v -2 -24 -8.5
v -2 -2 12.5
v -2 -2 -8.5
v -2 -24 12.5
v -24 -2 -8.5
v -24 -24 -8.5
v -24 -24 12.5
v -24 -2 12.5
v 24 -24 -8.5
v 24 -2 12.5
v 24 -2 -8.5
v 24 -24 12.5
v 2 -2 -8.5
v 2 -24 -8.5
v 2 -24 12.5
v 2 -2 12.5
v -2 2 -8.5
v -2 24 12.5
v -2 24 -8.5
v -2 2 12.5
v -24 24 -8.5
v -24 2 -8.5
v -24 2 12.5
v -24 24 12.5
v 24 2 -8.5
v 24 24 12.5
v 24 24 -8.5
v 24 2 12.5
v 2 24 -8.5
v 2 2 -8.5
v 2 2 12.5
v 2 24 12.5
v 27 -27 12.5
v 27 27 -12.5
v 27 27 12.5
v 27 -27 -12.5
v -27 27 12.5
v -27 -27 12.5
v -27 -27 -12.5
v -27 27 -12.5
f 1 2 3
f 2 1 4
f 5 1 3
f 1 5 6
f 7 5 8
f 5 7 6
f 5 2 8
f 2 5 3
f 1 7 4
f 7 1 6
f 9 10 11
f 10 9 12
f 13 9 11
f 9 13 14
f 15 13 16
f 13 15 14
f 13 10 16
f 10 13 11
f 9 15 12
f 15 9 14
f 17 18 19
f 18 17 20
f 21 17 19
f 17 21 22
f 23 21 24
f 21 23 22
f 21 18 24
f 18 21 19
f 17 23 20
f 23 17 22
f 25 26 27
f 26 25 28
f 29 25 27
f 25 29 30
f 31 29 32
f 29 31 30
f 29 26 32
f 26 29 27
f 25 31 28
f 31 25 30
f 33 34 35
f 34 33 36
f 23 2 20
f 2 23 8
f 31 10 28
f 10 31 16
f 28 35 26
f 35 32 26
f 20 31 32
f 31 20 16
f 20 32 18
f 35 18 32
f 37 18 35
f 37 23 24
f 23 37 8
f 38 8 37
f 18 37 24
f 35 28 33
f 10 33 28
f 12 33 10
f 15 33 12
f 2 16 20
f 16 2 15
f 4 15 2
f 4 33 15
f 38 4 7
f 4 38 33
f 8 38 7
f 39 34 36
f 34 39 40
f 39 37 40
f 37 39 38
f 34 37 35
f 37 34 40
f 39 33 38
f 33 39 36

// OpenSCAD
$fn = 32;

// ----------------------------------------------------------------------
// Pocket plate 54 x 54 x 25
// 2 x 2 pockets 22 mm square, 21 mm deep
// ----------------------------------------------------------------------

// --- parameters (mm) ---
thickness = 25;  // plate thickness
floor_t = 4;     // material left under each pocket
pocket = 22;     // pocket side length
pitch_x = 26;    // pocket pitch along X
pitch_y = 26;    // pocket pitch along Y
cols = 2;        // pockets per row
rows = 2;        // rows of pockets

// --- derived feature positions (mm) ---
depth = thickness - floor_t;        // = 21   pocket depth, down to the floor
span_x = (cols - 1) * pitch_x;      // = 26   distance between outer pockets
span_y = (rows - 1) * pitch_y;      // = 26   distance between outer pocket rows
origin_x = -span_x / 2;             // = -13   X of the first pocket
origin_y = -span_y / 2;             // = -13   Y of the first pocket
plate = [span_x + pocket + 6, span_y + pocket + 6, thickness];  // = [54, 54, 25]   overall size: pockets plus 3 mm of wall on each side
feature_centers = [
  [origin_x + 0 * pitch_x, origin_y + 0 * pitch_y],
  [origin_x + 1 * pitch_x, origin_y + 0 * pitch_y],
  [origin_x + 0 * pitch_x, origin_y + 1 * pitch_y],
  [origin_x + 1 * pitch_x, origin_y + 1 * pitch_y]
];   // pocket centres, used verbatim by the cutter loop

// plate outline, then one pocket per centre in feature_centers
difference() {
  cube(plate, center = true);
  for (centre = feature_centers)
    translate([centre[0] - pocket / 2, centre[1] - pocket / 2, plate[2] / 2 - depth])
      cube([pocket, pocket, depth + 1]);  // centred on the declared pocket centre
}
